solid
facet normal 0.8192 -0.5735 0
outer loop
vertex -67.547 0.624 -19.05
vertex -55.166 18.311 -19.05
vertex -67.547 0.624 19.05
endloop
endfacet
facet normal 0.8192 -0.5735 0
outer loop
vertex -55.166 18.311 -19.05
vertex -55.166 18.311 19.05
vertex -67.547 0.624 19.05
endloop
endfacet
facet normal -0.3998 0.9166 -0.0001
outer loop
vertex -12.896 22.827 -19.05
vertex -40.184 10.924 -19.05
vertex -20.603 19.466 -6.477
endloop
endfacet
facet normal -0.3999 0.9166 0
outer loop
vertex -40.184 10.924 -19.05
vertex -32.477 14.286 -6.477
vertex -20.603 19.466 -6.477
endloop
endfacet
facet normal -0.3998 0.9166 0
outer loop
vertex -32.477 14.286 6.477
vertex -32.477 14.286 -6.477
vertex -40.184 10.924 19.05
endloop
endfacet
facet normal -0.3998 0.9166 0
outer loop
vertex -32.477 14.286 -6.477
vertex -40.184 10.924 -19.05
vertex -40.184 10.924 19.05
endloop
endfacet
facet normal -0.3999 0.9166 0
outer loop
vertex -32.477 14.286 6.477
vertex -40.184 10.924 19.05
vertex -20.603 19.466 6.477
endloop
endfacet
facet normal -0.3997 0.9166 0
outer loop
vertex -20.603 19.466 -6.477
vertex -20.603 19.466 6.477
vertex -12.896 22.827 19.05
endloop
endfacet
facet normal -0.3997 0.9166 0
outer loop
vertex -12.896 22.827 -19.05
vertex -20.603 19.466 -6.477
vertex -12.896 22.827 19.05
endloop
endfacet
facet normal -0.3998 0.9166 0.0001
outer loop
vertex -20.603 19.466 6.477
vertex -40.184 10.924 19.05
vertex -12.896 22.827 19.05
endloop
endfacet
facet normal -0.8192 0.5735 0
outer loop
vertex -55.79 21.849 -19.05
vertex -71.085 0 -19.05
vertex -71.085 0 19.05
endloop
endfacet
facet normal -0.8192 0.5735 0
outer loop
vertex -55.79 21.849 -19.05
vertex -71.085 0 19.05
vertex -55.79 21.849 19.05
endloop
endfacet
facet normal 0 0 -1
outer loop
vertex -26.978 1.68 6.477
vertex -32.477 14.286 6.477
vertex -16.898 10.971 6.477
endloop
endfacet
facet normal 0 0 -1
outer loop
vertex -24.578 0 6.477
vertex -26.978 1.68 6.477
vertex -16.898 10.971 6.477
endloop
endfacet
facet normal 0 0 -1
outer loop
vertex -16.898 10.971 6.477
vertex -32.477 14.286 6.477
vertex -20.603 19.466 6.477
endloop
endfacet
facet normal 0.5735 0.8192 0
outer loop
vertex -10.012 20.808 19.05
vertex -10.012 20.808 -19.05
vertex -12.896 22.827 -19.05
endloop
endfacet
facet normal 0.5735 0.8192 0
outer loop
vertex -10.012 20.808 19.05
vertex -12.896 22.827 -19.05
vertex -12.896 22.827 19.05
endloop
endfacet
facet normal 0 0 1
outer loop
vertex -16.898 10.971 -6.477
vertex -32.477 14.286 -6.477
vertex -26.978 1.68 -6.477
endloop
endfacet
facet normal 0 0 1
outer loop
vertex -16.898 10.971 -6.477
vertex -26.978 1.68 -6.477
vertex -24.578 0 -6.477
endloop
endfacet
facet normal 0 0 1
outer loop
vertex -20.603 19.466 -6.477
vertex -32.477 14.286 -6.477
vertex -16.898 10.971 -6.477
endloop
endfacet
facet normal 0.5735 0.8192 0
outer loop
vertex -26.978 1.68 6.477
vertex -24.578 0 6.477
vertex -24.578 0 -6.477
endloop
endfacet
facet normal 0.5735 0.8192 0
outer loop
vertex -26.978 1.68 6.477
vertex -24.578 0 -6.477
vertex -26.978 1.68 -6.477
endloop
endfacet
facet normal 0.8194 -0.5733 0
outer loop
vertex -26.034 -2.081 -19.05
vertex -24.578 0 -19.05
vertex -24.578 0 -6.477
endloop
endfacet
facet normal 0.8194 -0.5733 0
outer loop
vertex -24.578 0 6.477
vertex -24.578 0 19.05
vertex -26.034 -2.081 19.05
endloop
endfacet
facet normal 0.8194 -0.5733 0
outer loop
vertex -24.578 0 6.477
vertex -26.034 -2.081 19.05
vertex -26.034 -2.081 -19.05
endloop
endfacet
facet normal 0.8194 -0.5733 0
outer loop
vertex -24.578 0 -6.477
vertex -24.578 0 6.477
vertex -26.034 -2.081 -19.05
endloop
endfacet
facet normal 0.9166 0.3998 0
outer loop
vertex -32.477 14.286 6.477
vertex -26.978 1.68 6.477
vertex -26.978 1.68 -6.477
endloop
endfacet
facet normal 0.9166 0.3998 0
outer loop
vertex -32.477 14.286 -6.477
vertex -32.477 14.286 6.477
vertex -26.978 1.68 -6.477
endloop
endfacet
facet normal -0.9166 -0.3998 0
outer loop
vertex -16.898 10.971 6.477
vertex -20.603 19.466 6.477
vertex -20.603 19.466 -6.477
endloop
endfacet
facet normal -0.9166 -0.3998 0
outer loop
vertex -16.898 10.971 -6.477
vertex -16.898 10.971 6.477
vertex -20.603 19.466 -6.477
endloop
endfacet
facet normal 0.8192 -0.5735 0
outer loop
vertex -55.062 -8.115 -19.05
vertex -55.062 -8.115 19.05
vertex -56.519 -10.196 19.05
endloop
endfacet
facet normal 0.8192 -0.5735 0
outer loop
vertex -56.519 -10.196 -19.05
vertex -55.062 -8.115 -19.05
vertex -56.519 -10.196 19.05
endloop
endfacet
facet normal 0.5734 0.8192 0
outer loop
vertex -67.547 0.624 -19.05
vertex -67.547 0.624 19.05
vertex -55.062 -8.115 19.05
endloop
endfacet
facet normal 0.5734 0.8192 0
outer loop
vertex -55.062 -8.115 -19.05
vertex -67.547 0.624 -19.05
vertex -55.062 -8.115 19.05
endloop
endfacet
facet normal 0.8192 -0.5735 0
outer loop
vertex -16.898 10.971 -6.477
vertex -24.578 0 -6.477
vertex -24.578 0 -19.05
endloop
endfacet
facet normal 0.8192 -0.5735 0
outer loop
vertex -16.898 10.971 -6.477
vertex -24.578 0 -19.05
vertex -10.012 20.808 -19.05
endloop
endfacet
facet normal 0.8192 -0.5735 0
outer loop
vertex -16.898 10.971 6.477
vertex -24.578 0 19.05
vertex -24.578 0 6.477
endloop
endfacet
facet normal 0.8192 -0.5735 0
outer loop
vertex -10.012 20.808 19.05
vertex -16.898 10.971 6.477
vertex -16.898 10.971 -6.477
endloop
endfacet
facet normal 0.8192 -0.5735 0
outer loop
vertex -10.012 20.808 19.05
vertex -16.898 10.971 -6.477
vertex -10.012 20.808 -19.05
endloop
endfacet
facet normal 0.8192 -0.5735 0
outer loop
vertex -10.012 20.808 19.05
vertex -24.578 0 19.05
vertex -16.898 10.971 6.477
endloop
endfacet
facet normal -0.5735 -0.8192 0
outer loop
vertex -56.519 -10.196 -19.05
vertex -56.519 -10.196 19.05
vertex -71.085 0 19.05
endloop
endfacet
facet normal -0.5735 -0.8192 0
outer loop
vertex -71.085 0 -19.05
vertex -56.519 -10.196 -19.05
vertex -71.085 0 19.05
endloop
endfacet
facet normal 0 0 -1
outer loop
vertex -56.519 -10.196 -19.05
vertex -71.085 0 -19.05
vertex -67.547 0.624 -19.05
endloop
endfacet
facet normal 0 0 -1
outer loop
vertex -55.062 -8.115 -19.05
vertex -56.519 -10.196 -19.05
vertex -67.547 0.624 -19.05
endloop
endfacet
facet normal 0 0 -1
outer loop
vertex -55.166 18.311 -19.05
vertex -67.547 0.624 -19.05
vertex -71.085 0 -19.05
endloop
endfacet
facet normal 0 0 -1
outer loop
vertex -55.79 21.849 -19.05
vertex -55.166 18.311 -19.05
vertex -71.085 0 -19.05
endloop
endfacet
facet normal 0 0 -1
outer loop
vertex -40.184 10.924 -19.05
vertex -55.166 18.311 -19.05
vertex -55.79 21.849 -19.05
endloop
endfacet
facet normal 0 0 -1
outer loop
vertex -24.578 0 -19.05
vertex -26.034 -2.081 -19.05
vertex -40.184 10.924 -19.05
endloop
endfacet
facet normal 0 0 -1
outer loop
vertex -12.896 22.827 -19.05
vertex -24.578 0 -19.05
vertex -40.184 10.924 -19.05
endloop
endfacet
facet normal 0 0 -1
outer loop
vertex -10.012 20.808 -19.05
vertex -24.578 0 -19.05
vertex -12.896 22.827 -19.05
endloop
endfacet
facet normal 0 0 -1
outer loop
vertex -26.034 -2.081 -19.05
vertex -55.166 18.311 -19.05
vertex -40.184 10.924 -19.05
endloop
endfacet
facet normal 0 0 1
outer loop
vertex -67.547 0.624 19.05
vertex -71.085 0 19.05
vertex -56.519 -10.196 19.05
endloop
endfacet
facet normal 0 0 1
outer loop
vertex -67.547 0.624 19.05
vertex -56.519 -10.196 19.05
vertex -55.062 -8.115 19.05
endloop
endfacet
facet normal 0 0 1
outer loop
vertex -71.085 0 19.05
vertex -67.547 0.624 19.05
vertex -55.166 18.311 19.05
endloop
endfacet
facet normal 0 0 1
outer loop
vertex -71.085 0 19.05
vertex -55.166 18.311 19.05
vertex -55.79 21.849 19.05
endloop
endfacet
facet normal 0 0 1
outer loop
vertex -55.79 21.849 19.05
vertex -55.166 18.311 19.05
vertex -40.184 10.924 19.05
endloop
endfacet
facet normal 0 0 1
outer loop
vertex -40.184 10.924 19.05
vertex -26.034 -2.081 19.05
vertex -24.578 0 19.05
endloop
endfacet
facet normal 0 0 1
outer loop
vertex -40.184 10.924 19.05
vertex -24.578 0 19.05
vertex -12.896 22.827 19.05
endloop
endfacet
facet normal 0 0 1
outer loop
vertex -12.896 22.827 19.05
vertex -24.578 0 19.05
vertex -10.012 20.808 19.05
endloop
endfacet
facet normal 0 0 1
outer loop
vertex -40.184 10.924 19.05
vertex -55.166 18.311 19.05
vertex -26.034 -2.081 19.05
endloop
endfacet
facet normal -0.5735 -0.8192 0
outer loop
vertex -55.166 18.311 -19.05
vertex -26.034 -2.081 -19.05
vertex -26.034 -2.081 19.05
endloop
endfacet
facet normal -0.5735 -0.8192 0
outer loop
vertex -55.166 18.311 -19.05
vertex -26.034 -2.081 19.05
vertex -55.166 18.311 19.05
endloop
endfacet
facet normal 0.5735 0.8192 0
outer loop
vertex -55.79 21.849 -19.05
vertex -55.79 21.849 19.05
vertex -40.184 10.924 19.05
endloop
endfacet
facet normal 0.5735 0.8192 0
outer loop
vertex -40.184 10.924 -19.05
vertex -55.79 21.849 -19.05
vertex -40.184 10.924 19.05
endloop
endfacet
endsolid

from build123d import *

# Parameters (mm, degrees)
EXTRUDE_THIN1_DEPTH              = 19.05
SKETCH8_W                        = 25.4
SKETCH8_H                        = 38.1
BOSS_EXTRUDE1_DEPTH              = 19.05
CUT_EXTRUDE3_DEPTH               = 87.66947312
CUT_EXTRUDE3_DEPTH_BACK          = 87.66947312
CUT_EXTRUDE4_REACH               = 76.686
CUT_EXTRUDE4_OFFSET_FROM_SURFACE = 2.54
SKETCH13_W                       = 12.954
SKETCH13_H                       = 12.954
CUT_EXTRUDE4_DIRECTION_2_DEPTH   = 73.146238944


with BuildPart() as part:
    # Sketch1 → Extrude-Thin1 (new, symmetric)
    with BuildSketch(Plane.XY):
        Polygon((-56.518566399, -10.196160483), (-71.084509945, 0), (-55.790269221, 21.84891532), (-24.57753305, 0), (-26.034127404, -2.080849078), (-55.166014498, 18.311471887), (-67.547066513, 0.624254723), (-55.061972044, -8.115311405), align=None)
    extrude(amount=EXTRUDE_THIN1_DEPTH, both=True)

    # Sketch8 → Boss-Extrude1 (add)
    with BuildSketch(Plane(origin=(-16.494988624, 11.546492037, 0), x_dir=(0.5734623443633238, 0.8192319205190437, 0), z_dir=(0.8192319205190437, -0.5734623443633238, 0))):
        with Locations((-1.394289721, 0)):
            Rectangle(SKETCH8_W, SKETCH8_H)
    extrude(amount=-BOSS_EXTRUDE1_DEPTH)

    # Sketch12 → Cut-Extrude3 (cut, two sides: drawn at the far end of the back side and taken through both)
    with BuildSketch(Plane(origin=(0, 0, -19.05), x_dir=(-1, 0, 0), z_dir=(0, 0, -1)).offset(-CUT_EXTRUDE3_DEPTH_BACK)):
        Polygon((40.183901135, 10.92445766), (12.895806765, 22.827442865), (25.617957589, 31.732948441), align=None)
    extrude(amount=CUT_EXTRUDE3_DEPTH + CUT_EXTRUDE3_DEPTH_BACK, mode=Mode.SUBTRACT)

    # Cut-Extrude4: up to this face of the body (flat: up to its plane, moved by the offset)
    cut_extrude4_end = Plane(part.part.faces().sort_by_distance((-40.600070951, 8.115311405, 0))[0]).offset(-CUT_EXTRUDE4_OFFSET_FROM_SURFACE)
    # Sketch13 → Cut-Extrude4 (cut, up to the picked face)
    with BuildSketch(Plane(origin=(-10.426997364, 23.904330147, 0), x_dir=(0.9165953540643084, 0.3998161538854141, 0), z_dir=(-0.3998161538854141, 0.9165953540643084, 0)), mode=Mode.PRIVATE) as cut_extrude4_sk1:
        with Locations((-17.579029301, 0)):
            Rectangle(SKETCH13_W, SKETCH13_H)
    cut_extrude4_tool1 = split(extrude(cut_extrude4_sk1.sketch, amount=-CUT_EXTRUDE4_REACH, mode=Mode.PRIVATE), bisect_by=cut_extrude4_end, keep=Keep.BOTH, mode=Mode.PRIVATE)
    add(cut_extrude4_tool1.solids().sort_by(Axis((-26.539854, 16.87595, 0), (0.3998161538854141, -0.9165953540643084, 0)))[0], mode=Mode.SUBTRACT)

    # Sketch13 → Cut-Extrude4 direction 2 (cut)
    with BuildSketch(Plane(origin=(-10.426997364, 23.904330147, 0), x_dir=(0.9165953540643084, 0.3998161538854141, 0), z_dir=(-0.3998161538854141, 0.9165953540643084, 0))):
        with Locations((-17.579029301, 0)):
            Rectangle(SKETCH13_W, SKETCH13_H)
    extrude(amount=CUT_EXTRUDE4_DIRECTION_2_DEPTH, mode=Mode.SUBTRACT)


solid = part.part
